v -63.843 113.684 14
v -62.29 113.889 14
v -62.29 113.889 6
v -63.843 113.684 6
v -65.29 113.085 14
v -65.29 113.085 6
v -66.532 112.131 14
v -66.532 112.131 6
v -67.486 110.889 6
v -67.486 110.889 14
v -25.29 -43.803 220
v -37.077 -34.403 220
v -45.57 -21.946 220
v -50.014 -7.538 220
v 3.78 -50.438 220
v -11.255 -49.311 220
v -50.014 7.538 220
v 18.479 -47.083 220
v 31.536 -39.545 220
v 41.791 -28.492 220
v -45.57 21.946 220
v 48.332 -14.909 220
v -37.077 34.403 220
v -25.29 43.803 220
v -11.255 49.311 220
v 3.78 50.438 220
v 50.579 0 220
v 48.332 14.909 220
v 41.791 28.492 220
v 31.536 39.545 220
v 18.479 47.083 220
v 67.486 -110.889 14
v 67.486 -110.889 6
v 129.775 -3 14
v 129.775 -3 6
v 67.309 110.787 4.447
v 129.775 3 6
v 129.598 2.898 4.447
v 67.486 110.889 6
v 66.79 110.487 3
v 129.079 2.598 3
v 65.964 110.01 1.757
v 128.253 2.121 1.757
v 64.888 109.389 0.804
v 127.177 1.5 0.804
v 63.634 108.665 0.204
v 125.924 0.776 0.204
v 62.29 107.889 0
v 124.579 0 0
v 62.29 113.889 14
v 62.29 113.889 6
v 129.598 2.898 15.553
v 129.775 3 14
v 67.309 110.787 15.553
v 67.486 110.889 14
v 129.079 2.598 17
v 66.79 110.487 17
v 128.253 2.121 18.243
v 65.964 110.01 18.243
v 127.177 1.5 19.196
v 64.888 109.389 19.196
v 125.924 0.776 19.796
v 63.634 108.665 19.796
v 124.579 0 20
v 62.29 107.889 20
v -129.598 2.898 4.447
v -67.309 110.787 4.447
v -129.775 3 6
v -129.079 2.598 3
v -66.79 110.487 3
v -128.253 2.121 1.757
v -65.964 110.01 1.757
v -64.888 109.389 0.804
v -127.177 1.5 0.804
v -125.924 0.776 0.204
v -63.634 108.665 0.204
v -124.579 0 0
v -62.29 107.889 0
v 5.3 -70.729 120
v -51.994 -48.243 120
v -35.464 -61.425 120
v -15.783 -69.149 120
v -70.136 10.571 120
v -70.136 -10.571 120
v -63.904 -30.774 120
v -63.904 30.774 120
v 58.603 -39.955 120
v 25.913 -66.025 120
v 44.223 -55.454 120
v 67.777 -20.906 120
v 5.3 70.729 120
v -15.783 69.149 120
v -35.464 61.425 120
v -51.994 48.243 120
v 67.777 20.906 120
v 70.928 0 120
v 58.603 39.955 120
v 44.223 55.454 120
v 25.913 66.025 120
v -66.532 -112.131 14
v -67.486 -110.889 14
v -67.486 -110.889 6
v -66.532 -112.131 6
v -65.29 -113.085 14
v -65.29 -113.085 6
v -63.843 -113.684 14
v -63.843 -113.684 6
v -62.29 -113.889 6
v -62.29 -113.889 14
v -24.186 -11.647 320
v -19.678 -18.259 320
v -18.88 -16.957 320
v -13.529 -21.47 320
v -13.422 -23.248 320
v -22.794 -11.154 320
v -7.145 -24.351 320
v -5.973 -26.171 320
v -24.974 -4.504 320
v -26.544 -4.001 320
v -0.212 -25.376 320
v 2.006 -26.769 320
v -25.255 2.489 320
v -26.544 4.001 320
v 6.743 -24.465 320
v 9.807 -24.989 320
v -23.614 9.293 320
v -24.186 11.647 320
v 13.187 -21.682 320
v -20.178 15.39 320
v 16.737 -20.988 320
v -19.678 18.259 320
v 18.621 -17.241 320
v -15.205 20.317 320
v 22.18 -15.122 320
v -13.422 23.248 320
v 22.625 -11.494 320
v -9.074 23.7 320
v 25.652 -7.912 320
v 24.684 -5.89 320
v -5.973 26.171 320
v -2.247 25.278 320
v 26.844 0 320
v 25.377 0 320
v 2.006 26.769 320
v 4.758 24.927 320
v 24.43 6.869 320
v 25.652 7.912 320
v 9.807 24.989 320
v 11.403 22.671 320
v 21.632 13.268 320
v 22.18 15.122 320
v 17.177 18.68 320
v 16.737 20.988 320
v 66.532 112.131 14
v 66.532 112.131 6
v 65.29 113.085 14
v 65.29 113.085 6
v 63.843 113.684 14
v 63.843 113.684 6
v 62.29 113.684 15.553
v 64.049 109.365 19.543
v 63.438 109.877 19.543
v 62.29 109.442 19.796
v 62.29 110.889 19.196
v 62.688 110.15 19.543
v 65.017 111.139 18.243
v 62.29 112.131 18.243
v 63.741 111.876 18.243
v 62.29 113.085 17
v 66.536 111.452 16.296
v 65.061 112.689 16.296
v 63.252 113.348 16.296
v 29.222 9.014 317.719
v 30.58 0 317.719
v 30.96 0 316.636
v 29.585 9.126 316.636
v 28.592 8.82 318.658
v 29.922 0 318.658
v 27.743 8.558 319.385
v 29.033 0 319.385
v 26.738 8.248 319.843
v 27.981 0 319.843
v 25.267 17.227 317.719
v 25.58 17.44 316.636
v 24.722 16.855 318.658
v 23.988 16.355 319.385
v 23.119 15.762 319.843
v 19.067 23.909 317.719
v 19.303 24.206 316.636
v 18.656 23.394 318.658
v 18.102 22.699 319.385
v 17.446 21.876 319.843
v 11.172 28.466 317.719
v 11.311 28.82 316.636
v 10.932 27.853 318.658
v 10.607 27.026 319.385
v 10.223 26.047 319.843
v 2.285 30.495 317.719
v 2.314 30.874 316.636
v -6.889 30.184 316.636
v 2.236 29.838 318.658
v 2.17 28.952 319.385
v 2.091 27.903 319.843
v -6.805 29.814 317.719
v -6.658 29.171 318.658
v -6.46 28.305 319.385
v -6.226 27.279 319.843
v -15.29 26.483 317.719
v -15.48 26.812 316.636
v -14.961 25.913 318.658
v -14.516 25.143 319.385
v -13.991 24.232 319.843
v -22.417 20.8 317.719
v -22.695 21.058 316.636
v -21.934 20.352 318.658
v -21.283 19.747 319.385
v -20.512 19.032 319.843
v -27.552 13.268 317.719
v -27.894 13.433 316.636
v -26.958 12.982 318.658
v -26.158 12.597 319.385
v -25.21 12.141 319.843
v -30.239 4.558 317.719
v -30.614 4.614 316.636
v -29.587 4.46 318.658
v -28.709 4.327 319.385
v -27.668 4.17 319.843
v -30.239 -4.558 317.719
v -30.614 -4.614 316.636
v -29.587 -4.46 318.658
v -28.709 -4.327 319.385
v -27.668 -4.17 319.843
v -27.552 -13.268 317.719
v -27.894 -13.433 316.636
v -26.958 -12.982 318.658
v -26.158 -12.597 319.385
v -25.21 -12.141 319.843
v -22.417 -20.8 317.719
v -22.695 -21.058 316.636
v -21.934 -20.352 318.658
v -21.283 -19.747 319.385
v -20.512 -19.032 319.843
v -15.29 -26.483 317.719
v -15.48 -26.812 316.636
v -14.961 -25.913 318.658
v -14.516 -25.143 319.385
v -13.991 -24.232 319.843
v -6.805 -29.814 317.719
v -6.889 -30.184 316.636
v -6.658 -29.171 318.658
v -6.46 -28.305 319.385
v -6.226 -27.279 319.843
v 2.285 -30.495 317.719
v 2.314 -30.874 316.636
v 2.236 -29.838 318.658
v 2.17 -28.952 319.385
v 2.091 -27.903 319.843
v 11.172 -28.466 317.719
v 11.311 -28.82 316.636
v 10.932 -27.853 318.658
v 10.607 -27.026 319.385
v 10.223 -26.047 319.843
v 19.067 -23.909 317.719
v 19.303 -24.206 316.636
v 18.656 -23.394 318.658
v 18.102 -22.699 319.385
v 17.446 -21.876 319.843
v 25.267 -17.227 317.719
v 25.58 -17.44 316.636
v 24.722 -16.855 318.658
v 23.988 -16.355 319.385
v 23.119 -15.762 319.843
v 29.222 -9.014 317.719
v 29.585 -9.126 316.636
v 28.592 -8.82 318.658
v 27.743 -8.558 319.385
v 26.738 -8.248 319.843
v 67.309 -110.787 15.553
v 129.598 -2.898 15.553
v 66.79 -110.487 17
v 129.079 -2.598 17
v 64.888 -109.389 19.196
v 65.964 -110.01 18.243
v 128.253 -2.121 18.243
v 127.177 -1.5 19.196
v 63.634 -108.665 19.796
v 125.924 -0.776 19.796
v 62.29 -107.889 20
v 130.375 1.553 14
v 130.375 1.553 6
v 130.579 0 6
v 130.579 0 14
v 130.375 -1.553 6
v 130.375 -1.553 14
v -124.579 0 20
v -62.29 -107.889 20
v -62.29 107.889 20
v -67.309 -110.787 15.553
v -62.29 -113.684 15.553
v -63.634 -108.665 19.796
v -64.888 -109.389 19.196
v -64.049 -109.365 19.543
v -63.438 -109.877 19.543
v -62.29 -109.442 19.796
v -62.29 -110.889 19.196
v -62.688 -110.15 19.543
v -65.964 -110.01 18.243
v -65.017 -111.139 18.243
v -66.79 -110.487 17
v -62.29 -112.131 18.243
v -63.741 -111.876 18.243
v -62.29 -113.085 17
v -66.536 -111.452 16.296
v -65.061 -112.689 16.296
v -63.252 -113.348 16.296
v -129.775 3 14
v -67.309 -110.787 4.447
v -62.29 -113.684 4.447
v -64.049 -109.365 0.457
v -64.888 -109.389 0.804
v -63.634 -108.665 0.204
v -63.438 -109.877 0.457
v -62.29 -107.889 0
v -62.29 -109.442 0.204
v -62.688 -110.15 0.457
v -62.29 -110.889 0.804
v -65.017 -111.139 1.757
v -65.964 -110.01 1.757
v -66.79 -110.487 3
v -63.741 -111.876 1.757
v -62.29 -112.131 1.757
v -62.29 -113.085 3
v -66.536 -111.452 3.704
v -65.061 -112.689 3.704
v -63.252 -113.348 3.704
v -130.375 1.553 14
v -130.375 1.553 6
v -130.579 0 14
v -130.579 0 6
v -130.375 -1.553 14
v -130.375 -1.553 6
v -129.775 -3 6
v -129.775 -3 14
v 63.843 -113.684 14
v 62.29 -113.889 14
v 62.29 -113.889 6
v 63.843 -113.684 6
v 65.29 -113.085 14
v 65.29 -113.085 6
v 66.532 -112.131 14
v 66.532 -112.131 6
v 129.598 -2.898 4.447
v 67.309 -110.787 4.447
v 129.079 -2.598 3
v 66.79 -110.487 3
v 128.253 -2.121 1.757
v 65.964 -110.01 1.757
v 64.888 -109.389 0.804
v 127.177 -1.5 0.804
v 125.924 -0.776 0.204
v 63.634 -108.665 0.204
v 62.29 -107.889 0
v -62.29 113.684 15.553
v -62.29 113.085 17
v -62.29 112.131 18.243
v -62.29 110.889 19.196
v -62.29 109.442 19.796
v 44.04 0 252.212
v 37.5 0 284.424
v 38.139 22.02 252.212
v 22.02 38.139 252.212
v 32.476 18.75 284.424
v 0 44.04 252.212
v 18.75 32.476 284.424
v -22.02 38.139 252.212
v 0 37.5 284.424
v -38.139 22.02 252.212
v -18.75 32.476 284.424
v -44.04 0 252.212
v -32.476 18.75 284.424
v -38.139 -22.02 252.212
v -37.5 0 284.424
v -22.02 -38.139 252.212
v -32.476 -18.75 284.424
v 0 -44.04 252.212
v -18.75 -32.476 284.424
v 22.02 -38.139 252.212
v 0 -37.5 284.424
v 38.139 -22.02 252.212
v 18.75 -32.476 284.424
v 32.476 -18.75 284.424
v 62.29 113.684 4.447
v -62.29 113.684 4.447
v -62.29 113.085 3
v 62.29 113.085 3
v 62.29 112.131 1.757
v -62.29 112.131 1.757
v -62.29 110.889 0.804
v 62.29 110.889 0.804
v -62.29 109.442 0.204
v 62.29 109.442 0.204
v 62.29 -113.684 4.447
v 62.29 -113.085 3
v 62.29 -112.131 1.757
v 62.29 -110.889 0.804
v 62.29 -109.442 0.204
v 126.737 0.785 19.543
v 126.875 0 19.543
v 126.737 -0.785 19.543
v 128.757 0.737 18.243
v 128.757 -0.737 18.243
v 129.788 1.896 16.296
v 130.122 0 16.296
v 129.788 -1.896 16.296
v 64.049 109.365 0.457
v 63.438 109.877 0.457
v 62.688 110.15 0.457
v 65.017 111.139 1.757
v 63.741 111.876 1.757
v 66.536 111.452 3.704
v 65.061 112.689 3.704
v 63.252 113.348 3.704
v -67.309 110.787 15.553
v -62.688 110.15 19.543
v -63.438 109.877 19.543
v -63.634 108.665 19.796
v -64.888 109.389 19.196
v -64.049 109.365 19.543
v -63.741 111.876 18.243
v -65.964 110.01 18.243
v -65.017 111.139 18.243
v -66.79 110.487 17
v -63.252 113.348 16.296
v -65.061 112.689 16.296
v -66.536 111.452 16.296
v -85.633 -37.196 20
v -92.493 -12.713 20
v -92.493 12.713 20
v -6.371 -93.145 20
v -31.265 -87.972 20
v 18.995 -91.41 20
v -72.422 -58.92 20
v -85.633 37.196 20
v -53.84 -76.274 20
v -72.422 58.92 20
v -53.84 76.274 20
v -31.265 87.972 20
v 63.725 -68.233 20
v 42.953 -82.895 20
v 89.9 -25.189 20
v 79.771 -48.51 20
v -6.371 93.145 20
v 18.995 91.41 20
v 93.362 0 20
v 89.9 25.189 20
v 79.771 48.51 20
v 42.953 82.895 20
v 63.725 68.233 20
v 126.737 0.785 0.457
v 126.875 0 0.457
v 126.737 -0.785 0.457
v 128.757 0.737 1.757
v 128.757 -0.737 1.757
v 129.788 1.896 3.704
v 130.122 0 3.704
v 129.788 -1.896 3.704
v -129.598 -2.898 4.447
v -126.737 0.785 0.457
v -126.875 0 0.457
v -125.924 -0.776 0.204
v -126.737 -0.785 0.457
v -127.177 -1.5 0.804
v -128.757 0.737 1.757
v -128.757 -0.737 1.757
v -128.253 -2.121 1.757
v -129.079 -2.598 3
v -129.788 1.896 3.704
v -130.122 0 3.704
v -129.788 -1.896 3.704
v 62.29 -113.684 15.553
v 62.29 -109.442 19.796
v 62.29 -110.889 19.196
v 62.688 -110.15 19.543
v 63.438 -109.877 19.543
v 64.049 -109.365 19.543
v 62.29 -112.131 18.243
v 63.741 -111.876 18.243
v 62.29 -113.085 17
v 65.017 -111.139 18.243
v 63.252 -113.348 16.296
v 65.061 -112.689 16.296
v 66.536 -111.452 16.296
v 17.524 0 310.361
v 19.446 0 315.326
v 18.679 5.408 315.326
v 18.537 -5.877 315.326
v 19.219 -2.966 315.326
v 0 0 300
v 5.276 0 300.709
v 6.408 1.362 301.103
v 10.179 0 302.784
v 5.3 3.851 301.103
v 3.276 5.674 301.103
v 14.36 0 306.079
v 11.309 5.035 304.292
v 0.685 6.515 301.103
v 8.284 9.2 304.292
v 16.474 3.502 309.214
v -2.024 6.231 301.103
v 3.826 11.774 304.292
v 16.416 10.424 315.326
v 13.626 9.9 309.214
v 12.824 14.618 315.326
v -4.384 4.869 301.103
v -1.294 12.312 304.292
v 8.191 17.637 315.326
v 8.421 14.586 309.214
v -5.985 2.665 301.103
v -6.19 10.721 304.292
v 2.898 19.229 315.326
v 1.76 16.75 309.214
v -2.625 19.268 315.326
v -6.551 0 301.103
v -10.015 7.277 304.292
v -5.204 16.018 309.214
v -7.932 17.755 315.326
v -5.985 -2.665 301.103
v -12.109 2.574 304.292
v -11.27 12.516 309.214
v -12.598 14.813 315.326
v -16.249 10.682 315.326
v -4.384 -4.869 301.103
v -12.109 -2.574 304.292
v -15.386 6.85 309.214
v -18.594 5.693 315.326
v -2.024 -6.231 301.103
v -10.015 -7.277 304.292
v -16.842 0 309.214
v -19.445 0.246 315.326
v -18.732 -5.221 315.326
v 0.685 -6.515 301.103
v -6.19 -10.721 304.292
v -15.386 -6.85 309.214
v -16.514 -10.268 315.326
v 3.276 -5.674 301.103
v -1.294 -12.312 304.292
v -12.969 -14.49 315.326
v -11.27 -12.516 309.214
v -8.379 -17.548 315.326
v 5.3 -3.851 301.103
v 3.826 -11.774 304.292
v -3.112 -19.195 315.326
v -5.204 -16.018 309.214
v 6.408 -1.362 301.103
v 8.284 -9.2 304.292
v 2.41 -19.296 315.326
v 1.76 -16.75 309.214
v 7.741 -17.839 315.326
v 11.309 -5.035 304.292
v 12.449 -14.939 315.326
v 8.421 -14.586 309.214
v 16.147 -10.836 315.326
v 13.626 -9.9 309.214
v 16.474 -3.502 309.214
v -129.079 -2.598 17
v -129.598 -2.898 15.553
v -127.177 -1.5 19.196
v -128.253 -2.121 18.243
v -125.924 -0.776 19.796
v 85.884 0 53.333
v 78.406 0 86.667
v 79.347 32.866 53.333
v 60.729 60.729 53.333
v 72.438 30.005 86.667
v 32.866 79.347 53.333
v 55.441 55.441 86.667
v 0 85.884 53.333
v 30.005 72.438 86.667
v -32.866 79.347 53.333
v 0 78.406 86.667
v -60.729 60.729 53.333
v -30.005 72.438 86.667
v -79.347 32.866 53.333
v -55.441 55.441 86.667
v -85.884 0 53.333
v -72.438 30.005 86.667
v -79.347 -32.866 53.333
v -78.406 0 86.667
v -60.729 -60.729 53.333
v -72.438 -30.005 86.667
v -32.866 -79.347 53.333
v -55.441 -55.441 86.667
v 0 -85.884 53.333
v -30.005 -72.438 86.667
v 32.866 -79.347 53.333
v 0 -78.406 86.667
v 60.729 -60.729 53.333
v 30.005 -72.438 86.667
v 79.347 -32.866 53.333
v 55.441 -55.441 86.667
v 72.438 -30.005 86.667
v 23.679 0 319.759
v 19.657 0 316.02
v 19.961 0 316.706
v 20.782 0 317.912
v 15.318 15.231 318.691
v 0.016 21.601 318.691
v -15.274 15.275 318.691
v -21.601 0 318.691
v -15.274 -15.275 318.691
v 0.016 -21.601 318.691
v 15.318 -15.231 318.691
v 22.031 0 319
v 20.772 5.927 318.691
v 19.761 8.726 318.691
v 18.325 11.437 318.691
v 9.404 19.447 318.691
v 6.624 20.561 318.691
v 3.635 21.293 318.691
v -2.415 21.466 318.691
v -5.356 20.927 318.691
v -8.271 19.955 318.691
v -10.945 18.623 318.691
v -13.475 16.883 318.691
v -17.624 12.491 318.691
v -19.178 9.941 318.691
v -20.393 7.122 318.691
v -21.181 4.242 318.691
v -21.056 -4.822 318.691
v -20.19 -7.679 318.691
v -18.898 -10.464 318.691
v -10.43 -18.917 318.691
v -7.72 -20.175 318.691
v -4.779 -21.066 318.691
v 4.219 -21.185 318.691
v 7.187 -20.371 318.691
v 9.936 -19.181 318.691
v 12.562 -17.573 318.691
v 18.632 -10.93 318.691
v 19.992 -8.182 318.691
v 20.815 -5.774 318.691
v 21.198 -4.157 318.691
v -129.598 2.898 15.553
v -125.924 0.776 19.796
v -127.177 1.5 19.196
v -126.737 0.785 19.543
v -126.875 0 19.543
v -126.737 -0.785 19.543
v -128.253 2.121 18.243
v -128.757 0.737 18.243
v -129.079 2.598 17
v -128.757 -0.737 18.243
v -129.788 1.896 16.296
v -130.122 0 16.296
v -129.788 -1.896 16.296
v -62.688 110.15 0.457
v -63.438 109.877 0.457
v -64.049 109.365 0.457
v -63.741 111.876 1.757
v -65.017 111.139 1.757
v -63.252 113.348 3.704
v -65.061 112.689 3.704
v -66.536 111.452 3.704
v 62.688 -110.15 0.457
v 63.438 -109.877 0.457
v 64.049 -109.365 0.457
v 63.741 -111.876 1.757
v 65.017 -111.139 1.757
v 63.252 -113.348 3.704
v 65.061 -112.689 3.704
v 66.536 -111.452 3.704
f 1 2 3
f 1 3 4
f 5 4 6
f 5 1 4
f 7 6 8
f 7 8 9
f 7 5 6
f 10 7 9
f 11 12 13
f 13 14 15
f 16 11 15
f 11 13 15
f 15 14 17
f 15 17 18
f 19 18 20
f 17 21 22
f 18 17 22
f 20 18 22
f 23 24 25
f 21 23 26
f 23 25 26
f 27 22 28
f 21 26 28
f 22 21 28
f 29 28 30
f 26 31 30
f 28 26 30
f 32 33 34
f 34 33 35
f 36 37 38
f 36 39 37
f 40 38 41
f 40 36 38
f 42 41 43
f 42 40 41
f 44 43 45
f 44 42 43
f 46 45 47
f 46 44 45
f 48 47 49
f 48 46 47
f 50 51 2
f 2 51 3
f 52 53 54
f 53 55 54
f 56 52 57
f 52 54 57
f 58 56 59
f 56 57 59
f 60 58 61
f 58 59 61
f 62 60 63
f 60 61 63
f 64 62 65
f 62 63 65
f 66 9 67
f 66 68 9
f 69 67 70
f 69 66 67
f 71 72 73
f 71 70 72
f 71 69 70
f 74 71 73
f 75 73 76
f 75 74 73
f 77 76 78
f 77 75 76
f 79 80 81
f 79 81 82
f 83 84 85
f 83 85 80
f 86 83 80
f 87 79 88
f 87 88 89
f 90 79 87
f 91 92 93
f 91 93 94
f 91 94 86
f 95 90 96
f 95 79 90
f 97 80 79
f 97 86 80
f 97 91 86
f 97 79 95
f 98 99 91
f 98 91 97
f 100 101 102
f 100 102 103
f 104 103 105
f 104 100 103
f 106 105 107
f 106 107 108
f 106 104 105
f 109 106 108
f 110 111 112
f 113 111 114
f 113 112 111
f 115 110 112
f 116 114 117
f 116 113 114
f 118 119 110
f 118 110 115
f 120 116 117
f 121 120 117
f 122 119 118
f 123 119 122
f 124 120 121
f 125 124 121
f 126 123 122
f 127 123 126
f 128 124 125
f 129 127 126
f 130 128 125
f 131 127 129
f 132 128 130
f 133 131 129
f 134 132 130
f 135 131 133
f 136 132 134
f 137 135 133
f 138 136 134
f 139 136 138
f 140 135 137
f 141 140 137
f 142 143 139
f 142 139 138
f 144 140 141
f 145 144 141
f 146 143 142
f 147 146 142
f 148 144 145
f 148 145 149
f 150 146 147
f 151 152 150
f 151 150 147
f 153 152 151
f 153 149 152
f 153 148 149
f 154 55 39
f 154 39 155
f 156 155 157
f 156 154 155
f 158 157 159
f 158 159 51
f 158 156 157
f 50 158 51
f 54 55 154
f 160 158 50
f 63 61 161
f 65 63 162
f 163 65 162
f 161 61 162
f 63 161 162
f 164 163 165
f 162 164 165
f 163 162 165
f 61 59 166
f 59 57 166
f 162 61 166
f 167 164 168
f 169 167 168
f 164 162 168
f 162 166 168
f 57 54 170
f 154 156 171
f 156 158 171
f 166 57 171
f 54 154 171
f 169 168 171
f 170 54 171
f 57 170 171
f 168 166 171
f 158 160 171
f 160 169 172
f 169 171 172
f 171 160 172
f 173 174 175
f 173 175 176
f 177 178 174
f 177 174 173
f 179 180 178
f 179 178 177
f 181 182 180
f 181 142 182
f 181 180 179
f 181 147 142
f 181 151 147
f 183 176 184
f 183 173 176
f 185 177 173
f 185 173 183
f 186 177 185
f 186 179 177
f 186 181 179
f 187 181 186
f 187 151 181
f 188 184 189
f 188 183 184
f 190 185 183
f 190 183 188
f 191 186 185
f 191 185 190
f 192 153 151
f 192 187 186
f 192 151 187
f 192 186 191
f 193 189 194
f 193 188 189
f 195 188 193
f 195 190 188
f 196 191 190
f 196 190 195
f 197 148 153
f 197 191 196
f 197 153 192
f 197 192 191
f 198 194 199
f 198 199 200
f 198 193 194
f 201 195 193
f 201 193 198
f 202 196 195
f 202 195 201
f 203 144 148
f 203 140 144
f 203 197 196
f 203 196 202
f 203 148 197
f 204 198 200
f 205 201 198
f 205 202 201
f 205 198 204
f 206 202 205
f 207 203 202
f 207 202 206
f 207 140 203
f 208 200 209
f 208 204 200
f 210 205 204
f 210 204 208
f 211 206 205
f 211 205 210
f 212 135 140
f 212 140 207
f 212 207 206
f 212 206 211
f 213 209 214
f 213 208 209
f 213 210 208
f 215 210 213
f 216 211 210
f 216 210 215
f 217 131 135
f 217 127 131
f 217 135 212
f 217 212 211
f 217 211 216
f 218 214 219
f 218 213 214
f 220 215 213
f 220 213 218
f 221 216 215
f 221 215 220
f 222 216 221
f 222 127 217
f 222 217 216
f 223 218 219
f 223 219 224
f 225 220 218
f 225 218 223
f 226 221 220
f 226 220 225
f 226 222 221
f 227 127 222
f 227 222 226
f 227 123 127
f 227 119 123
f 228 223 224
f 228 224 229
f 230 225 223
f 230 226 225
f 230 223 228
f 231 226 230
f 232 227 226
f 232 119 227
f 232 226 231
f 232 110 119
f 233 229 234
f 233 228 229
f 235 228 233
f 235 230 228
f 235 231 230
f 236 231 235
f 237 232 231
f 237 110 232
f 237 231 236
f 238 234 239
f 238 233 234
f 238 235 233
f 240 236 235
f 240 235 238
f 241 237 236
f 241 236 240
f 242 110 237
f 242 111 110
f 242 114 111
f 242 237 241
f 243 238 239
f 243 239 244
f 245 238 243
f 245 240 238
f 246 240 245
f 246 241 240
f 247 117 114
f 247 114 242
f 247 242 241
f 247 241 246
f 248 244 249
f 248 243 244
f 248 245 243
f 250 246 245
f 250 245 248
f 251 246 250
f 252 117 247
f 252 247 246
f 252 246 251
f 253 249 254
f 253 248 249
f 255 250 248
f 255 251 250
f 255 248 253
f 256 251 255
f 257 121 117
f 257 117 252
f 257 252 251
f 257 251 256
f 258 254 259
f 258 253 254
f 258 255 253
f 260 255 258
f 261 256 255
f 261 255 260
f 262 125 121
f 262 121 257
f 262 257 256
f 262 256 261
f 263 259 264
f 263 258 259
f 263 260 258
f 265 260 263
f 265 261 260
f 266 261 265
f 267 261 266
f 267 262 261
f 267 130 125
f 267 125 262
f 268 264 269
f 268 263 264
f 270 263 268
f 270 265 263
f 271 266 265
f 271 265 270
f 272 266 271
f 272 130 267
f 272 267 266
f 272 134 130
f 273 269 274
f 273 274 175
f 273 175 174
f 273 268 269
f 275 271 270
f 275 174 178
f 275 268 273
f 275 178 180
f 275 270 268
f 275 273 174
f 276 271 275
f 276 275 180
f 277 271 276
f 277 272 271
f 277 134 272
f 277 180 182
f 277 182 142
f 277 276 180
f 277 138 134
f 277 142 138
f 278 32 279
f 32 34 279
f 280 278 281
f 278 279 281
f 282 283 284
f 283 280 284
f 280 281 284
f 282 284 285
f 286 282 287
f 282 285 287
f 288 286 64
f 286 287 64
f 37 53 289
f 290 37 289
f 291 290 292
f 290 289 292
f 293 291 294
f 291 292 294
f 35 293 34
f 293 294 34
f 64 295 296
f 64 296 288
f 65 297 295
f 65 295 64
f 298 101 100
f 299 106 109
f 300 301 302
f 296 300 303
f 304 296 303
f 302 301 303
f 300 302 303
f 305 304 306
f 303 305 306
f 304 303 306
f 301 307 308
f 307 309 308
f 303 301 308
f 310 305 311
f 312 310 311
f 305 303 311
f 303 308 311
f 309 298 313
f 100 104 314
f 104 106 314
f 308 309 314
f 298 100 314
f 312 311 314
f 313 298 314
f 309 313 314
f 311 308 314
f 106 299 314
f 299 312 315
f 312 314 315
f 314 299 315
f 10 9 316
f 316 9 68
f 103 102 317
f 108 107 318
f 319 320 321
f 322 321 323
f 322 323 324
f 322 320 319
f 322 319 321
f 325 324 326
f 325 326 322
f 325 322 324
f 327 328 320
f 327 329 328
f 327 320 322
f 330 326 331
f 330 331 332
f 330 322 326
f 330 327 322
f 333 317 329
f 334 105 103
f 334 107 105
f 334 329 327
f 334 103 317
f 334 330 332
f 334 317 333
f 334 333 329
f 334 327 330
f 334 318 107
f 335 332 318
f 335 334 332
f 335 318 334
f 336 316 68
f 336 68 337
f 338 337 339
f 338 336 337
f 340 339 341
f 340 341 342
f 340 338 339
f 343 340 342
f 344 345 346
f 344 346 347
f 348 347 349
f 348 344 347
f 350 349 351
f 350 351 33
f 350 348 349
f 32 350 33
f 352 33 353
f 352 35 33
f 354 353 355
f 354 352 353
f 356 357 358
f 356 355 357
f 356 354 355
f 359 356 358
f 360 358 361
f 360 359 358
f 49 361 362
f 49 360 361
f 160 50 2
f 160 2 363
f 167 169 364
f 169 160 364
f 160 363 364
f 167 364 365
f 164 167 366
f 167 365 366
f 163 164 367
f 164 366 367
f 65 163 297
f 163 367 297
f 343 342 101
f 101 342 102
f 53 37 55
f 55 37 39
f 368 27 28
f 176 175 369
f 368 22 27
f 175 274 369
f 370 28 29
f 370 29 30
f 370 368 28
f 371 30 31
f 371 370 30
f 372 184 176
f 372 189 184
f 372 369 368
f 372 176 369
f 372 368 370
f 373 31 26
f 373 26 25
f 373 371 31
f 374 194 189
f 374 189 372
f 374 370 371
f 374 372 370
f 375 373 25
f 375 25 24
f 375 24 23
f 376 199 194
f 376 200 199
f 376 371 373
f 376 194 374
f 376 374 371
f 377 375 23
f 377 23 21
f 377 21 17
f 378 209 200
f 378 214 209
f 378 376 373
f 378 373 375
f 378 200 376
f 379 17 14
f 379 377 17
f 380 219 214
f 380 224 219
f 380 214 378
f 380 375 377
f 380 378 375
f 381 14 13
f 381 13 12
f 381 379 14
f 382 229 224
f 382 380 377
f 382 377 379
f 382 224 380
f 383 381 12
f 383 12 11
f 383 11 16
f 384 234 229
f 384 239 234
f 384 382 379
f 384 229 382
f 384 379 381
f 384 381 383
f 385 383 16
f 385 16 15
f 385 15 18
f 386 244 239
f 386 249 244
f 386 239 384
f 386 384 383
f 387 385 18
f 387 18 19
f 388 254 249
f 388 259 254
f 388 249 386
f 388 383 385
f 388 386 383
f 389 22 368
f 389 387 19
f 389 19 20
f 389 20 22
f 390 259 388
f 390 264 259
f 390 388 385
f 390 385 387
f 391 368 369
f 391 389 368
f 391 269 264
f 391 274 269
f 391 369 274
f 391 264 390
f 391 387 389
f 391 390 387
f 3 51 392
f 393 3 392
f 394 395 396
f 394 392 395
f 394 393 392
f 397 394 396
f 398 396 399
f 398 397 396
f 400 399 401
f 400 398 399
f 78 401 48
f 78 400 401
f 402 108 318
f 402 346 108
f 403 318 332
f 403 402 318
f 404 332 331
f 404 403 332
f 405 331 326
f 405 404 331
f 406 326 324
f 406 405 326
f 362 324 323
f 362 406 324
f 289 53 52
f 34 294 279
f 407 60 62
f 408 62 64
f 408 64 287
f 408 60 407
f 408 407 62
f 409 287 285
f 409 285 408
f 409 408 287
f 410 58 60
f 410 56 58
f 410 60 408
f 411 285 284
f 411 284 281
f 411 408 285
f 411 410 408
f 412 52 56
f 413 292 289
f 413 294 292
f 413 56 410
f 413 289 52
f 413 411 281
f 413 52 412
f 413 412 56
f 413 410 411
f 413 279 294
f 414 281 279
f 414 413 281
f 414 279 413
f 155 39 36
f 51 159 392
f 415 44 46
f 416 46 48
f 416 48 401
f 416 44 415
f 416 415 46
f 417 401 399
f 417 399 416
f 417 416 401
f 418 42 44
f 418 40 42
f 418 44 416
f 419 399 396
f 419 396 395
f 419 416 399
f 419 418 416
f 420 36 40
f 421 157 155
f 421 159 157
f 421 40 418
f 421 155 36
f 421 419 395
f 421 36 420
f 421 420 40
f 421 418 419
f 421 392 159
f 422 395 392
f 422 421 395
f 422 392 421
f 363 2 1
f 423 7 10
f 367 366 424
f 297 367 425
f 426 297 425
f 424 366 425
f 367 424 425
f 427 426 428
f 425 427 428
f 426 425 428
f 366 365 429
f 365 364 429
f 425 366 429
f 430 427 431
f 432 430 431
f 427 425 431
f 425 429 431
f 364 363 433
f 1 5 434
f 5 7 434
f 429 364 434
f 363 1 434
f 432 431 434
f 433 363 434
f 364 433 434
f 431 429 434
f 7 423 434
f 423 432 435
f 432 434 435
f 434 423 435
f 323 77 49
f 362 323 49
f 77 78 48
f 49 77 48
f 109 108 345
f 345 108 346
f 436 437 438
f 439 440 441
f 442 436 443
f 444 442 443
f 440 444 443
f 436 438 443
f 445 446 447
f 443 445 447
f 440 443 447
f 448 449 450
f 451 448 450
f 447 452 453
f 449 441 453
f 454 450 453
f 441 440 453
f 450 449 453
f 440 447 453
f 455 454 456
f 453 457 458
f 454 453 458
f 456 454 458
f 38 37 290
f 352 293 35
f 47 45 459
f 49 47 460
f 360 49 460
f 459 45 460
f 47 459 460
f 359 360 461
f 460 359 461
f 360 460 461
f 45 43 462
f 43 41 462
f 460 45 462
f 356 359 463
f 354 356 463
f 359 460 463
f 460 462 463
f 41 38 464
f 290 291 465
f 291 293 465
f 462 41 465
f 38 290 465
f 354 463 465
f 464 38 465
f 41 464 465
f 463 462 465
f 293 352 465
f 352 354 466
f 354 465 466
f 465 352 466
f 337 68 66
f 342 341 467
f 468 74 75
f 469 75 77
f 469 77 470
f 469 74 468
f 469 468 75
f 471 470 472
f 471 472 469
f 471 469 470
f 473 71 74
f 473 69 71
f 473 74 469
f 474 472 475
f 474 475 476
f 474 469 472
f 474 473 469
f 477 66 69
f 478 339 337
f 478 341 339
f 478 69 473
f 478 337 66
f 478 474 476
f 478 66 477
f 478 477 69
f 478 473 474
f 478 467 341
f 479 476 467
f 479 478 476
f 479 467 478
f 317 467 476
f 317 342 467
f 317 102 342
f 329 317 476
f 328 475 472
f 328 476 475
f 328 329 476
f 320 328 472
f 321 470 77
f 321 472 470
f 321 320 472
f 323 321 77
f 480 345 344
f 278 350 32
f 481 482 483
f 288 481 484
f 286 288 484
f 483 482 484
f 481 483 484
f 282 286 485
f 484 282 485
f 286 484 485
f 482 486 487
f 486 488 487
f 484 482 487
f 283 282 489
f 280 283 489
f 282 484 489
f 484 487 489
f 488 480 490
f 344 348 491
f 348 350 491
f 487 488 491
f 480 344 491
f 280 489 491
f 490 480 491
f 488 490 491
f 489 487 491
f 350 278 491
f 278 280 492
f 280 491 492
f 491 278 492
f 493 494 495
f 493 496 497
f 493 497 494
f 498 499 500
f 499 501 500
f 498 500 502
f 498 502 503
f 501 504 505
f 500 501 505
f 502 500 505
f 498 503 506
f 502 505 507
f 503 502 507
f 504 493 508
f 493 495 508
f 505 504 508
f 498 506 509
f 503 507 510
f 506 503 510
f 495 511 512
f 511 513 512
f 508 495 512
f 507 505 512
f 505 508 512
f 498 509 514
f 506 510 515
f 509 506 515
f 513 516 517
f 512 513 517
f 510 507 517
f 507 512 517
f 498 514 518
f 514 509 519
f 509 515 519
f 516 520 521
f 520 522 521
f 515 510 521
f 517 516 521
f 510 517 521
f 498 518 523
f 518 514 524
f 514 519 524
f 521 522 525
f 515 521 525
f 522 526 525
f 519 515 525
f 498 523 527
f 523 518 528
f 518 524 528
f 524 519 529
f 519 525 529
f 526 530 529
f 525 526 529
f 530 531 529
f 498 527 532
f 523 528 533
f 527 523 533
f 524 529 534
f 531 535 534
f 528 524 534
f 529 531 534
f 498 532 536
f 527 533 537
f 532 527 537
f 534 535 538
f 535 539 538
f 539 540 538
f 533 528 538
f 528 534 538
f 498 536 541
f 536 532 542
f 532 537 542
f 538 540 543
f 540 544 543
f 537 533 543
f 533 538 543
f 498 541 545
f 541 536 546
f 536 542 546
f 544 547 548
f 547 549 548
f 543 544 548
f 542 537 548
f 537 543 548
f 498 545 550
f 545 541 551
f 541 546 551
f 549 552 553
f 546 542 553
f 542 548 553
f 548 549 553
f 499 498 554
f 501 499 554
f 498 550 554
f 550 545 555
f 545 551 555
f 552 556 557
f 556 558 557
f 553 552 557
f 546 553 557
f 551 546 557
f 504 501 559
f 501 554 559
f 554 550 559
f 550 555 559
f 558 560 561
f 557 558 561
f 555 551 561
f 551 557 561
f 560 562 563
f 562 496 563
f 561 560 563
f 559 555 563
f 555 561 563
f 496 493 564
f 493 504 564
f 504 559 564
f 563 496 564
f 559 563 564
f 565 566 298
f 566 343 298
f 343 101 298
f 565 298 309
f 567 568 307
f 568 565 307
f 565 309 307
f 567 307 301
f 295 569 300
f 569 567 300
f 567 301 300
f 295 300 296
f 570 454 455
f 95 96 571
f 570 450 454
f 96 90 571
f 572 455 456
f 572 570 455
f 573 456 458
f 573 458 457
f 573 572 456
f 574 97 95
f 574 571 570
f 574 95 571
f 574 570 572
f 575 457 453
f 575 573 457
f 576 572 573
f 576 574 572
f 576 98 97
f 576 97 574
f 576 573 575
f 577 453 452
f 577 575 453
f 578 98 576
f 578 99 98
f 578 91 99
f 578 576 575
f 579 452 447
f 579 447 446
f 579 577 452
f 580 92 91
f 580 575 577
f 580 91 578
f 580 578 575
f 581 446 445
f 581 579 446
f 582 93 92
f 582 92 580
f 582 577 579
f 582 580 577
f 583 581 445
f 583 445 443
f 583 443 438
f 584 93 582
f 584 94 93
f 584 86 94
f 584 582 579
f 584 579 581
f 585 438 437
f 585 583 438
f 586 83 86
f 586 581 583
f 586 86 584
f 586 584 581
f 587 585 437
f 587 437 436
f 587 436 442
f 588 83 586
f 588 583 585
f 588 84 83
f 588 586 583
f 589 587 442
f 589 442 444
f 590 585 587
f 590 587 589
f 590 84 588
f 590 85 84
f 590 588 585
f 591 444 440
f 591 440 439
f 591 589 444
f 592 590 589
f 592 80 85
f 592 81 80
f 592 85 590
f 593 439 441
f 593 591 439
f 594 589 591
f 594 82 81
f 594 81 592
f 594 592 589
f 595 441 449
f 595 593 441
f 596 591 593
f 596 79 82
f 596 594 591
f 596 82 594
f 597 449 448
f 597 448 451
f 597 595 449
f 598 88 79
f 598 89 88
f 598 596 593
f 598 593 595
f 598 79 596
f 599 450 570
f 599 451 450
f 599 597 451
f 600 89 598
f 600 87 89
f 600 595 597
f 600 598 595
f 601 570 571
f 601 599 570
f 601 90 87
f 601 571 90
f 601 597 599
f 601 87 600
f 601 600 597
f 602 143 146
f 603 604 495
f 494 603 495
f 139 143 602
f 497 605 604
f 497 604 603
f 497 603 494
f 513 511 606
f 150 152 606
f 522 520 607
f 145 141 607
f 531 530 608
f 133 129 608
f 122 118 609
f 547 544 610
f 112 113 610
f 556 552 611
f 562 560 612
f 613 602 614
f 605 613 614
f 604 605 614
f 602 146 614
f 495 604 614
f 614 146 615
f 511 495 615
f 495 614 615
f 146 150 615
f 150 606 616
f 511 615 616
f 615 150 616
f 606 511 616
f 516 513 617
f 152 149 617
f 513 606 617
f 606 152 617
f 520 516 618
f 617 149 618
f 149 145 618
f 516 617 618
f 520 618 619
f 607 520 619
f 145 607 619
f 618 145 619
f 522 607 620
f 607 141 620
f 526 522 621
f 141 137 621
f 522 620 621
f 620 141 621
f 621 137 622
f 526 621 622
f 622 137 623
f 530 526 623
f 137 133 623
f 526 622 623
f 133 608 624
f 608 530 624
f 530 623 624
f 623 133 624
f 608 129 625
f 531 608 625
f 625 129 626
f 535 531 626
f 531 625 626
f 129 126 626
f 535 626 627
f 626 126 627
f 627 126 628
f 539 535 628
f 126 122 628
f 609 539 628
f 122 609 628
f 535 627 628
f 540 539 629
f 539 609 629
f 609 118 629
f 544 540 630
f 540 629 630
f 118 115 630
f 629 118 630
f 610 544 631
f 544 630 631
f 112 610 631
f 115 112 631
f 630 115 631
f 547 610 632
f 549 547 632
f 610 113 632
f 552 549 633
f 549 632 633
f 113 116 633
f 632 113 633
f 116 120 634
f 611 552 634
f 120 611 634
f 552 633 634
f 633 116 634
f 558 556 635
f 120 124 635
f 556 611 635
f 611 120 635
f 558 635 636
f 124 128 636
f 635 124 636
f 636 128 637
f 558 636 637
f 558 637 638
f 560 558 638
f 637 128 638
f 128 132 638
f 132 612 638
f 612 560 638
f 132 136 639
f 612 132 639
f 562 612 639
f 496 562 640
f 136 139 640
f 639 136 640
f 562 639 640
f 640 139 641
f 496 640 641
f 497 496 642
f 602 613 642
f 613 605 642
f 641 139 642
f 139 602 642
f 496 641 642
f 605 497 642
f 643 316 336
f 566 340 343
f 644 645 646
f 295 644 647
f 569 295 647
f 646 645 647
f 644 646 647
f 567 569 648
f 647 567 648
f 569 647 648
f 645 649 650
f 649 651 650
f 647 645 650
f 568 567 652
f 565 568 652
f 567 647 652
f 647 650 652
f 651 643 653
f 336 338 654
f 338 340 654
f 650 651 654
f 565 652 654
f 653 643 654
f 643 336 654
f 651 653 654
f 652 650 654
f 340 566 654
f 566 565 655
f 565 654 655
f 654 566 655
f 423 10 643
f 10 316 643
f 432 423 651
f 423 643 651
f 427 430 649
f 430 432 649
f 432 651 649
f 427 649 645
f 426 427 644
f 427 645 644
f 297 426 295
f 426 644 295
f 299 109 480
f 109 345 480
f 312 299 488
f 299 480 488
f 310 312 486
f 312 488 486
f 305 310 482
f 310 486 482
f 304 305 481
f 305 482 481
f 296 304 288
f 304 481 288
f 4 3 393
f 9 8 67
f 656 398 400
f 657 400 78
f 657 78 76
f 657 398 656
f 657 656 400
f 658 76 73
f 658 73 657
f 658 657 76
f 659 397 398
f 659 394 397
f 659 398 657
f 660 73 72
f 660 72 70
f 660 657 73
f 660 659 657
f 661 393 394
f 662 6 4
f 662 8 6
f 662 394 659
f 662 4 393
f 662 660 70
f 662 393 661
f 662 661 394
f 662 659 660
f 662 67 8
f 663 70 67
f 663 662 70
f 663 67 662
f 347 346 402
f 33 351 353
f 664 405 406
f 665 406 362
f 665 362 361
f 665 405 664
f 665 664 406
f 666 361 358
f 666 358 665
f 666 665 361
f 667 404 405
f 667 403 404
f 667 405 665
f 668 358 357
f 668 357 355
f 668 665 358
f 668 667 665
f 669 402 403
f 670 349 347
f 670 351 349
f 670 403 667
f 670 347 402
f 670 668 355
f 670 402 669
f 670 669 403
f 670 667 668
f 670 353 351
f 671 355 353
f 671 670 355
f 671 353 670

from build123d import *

# Parameters (mm, degrees)
PAD_DEPTH   = 20
FILLET001_R = 6
SKETCH001_R = 93.362404
SKETCH002_R = 70.9278
SKETCH007_R = 50.579408
SKETCH006_R = 30.277138
FILLET_R    = 4.2
FILLET002_R = 6.1


with BuildPart() as body:
    # Sketch → Pad (new body)
    with BuildSketch(Plane.XY):
        Polygon((131.507385, 0), (65.753693, 113.888736), (-65.753693, 113.888736), (-131.507385, 0), (-65.753693, -113.888736), (65.753693, -113.888736), align=None)
    extrude(amount=PAD_DEPTH)

    # Fillet001
    fillet001_edges = [body.edges().sort_by_distance(p)[0] for p in [
        (131.507385, 0, 10),
        (65.753693, 113.888736, 10),
        (98.630539, 56.944368, 0),
        (98.630539, 56.944368, 20),
        (-65.753693, 113.888736, 10),
        (0, 113.888736, 0),
        (0, 113.888736, 20),
        (-131.507385, 0, 10),
        (-98.630539, 56.944368, 0),
        (-98.630539, 56.944368, 20),
        (-65.753693, -113.888736, 10),
        (-98.630539, -56.944368, 0),
        (-98.630539, -56.944368, 20),
        (65.753693, -113.888736, 10),
        (0, -113.888736, 0),
        (0, -113.888736, 20),
        (98.630539, -56.944368, 0),
        (98.630539, -56.944368, 20),
    ]]
    fillet(fillet001_edges, radius=FILLET001_R)


with BuildPart() as loft_body:
    # Sketch001 (on Face8 of Pad) → Loft section 0
    with BuildSketch(Plane.XY.offset(20)):
        Circle(SKETCH001_R)
    # Sketch002 (on Face8 of Pad) → Loft section 1
    with BuildSketch(Plane.XY.offset(120)):
        Circle(SKETCH002_R)
    loft()


with BuildPart() as sphere:
    # Sphere → Sphere (revolve)
    with BuildSketch(Plane(origin=(0, 0, 320), x_dir=(1, 0, 0), z_dir=(0, -1, 0))):
        with BuildLine():
            ThreePointArc((0, -20), (20, 0), (0, 20))
            Line((0, 20), (0, -20))
        make_face()
    revolve(axis=Axis((0, 0, 320), (0, 0, 1)))


with BuildPart() as fillet002:
    # Sketch007 (on Face8 of Pad) → Loft002 section 0
    with BuildSketch(Plane.XY.offset(220)):
        Circle(SKETCH007_R)
    # Sketch006 (on Face8 of Pad) → Loft002 section 1
    with BuildSketch(Plane.XY.offset(320)):
        Circle(SKETCH006_R)
    loft()

    # Fillet
    fillet_edges = [fillet002.edges().sort_by_distance(p)[0] for p in [
        (-30.277138, 0, 320),
    ]]
    fillet(fillet_edges, radius=FILLET_R)

    # Cut: cut Sphere
    add(sphere.part, mode=Mode.SUBTRACT)

    # Fillet002
    fillet002_edges = [fillet002.edges().sort_by_distance(p)[0] for p in [
        (-20, 0, 320),
    ]]
    fillet(fillet002_edges, radius=FILLET002_R)


solid = Compound([body.part, loft_body.part, fillet002.part])
